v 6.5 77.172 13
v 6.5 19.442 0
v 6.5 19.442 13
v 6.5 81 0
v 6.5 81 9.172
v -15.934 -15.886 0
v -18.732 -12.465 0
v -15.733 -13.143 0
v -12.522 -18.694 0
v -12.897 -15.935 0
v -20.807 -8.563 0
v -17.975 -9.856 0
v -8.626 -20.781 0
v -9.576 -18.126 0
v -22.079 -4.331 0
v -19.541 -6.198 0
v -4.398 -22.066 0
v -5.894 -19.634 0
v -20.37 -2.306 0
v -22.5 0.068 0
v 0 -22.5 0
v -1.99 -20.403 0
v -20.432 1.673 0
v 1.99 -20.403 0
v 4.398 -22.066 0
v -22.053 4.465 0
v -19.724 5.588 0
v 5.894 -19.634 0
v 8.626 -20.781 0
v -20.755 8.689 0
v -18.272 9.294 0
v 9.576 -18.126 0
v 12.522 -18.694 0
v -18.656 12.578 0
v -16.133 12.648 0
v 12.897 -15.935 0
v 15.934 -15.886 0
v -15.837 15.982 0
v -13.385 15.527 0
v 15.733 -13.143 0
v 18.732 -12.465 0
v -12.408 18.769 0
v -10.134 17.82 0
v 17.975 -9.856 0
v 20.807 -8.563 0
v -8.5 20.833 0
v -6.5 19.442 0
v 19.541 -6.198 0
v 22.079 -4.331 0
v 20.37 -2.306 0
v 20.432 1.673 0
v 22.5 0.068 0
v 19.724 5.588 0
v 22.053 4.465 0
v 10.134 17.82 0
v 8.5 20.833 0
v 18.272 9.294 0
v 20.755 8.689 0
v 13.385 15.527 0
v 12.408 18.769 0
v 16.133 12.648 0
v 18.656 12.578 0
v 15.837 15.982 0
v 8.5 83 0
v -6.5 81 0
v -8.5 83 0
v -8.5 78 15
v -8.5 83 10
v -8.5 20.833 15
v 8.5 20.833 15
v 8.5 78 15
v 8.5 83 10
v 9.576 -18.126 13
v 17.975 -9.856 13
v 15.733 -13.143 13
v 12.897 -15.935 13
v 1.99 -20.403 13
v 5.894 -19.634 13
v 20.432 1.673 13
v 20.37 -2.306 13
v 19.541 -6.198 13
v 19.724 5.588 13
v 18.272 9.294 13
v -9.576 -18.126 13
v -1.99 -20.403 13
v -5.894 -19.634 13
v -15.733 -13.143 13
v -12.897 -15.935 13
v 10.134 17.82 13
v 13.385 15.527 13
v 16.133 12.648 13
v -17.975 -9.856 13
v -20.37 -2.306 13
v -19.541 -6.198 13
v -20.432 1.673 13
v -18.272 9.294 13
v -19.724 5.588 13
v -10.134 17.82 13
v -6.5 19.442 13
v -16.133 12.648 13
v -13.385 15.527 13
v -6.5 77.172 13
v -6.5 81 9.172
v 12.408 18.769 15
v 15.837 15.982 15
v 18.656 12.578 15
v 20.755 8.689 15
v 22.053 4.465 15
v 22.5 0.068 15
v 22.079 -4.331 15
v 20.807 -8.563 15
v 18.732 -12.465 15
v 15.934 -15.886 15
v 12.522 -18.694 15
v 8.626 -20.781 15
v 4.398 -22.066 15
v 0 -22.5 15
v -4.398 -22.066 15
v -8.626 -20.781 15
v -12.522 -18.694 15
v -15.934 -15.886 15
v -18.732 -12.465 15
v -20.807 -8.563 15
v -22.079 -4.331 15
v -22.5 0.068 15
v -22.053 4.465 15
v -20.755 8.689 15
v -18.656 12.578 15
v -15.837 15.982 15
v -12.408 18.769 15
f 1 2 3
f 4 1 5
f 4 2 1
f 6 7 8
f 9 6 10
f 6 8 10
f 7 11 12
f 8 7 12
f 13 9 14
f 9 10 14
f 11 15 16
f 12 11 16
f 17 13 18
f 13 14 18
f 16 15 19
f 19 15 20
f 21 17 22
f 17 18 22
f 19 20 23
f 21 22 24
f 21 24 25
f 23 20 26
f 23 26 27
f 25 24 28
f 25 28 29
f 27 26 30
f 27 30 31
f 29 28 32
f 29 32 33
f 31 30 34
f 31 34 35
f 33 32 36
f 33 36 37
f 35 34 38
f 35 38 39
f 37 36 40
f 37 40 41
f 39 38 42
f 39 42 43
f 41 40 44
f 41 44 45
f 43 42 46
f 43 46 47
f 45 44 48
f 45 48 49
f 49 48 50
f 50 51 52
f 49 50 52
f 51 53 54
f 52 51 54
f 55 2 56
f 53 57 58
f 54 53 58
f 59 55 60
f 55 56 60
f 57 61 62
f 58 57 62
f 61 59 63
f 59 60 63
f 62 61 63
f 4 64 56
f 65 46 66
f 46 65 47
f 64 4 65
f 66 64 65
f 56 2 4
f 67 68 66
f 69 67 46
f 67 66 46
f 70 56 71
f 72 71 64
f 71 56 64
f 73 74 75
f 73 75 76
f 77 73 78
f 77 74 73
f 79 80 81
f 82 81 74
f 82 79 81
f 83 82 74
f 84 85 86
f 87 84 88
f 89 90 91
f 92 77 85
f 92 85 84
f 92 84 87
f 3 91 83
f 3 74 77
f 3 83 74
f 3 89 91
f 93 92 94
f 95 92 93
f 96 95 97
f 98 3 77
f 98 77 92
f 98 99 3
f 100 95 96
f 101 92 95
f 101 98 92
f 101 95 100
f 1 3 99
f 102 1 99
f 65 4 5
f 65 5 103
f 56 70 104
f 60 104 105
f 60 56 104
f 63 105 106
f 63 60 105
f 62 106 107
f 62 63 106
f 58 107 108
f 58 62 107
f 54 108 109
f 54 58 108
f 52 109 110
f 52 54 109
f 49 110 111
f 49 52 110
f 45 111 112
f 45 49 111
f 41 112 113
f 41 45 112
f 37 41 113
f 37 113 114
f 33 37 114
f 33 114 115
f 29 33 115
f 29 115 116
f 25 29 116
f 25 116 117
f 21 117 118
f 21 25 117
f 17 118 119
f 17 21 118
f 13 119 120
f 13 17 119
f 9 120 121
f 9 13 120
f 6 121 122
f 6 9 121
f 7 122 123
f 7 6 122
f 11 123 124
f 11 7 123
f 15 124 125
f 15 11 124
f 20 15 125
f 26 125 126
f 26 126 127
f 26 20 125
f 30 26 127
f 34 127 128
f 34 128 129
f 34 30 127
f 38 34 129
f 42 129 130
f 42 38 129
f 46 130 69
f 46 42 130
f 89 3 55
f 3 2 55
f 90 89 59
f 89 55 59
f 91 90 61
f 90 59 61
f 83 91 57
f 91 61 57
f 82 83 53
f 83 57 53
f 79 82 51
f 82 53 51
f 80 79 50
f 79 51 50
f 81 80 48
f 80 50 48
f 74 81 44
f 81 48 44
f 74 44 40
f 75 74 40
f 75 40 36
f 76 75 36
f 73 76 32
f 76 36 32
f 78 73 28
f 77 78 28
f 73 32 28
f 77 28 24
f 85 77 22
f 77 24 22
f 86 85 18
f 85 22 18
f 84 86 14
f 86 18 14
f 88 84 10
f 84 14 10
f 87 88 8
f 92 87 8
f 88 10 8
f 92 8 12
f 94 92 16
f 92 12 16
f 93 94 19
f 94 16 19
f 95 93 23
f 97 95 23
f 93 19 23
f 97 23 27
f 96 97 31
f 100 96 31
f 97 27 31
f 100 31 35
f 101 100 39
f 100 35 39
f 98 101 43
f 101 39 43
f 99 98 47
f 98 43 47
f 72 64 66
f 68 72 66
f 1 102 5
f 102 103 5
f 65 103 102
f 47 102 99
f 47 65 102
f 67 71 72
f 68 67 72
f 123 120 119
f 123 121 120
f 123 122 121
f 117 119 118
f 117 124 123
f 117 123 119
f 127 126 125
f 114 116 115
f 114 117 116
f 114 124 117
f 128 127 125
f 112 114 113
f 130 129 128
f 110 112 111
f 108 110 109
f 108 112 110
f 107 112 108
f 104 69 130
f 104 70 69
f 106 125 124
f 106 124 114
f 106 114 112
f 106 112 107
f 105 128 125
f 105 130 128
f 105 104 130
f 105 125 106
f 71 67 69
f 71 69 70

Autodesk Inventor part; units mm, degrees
ref_plane "YZ Plane" through (0, 0, 0) normal (1, 0, 0) x (0, 1, 0)
ref_plane "XZ Plane" through (0, 0, 0) normal (0, 1, 0) x (-1, 0, 0)
ref_plane "XY Plane" through (0, 0, 0) normal (0, 0, 1) x (1, 0, 0)
sketch "Sketch3" plane through (0, 0, 0) normal (0, 0, 1) x (1, 0, 0)
  circle A0 centre (0, 0) radius 22.5
  line L0 (-8.5, 0) -> (8.5, 0)
  line L1 (8.5, 0) -> (8.5, 83)
  line L2 (8.5, 83) -> (-8.5, 83)
  line L3 (-8.5, 83) -> (-8.5, 0)
  dimension "d5" = 45
  dimension "d6" = 83
  dimension "d7" = 17
extrude "Extrusion3" add sketch "Sketch3" along normal blind 15
sketch "Sketch4" plane through (0, 0, 0) normal (0, 0, -1) x (-1, 0, 0)
  arc A0 (-8.5, 20.8327) -> (8.5, 20.8327) centre (0, 0) ccw projected
  line L0 (8.5, 83) -> (8.5, 20.8327) projected
  line L1 (-8.5, 83) -> (8.5, 83) projected
  line L2 (-8.5, 20.8327) -> (-8.5, 83) projected
  arc A1 (-6.5, 19.4422) -> (6.5, 19.4422) centre (0, 0) ccw
  line L3 (-6.5, 19.4422) -> (-6.5, 81)
  line L4 (-6.5, 81) -> (6.5, 81)
  line L5 (6.5, 81) -> (6.5, 19.4422)
  dimension "d10" = 2
extrude "Extrusion4" cut sketch "Sketch4" against normal blind 13 contours L3 L4 L5 A1
chamfer "Chamfer1" distance 5 angle 45 1 edges at (0, 83, 15)
sketch "Sketch6" plane through (-8.5, 78, 15) normal (0, 0.7071068, 0.7071068) x (1, 0, 0)
  line L0 (2, 2.8284) -> (2, 4.2426) projected
  line L1 (2, 4.2426) -> (15, 4.2426) projected
  line L2 (15, 4.2426) -> (15, 2.8284) projected
  line L3 (15, 2.8284) -> (2, 2.8284) projected
  line L4 (0, 7.0711) -> (0, 0) projected
  line L5 (0, 0) -> (17, 0) projected
  line L6 (17, 0) -> (17, 7.0711) projected
  line L7 (17, 7.0711) -> (0, 7.0711) projected
  point P0 (8.5, -44.5477)
extrude "Extrusion5" add sketch "Sketch6" against normal blind 2 contours L0 L1 L2 L3 | L7 L6 L5 L4
properties part number "TARM10" material "ABS Plastic"
